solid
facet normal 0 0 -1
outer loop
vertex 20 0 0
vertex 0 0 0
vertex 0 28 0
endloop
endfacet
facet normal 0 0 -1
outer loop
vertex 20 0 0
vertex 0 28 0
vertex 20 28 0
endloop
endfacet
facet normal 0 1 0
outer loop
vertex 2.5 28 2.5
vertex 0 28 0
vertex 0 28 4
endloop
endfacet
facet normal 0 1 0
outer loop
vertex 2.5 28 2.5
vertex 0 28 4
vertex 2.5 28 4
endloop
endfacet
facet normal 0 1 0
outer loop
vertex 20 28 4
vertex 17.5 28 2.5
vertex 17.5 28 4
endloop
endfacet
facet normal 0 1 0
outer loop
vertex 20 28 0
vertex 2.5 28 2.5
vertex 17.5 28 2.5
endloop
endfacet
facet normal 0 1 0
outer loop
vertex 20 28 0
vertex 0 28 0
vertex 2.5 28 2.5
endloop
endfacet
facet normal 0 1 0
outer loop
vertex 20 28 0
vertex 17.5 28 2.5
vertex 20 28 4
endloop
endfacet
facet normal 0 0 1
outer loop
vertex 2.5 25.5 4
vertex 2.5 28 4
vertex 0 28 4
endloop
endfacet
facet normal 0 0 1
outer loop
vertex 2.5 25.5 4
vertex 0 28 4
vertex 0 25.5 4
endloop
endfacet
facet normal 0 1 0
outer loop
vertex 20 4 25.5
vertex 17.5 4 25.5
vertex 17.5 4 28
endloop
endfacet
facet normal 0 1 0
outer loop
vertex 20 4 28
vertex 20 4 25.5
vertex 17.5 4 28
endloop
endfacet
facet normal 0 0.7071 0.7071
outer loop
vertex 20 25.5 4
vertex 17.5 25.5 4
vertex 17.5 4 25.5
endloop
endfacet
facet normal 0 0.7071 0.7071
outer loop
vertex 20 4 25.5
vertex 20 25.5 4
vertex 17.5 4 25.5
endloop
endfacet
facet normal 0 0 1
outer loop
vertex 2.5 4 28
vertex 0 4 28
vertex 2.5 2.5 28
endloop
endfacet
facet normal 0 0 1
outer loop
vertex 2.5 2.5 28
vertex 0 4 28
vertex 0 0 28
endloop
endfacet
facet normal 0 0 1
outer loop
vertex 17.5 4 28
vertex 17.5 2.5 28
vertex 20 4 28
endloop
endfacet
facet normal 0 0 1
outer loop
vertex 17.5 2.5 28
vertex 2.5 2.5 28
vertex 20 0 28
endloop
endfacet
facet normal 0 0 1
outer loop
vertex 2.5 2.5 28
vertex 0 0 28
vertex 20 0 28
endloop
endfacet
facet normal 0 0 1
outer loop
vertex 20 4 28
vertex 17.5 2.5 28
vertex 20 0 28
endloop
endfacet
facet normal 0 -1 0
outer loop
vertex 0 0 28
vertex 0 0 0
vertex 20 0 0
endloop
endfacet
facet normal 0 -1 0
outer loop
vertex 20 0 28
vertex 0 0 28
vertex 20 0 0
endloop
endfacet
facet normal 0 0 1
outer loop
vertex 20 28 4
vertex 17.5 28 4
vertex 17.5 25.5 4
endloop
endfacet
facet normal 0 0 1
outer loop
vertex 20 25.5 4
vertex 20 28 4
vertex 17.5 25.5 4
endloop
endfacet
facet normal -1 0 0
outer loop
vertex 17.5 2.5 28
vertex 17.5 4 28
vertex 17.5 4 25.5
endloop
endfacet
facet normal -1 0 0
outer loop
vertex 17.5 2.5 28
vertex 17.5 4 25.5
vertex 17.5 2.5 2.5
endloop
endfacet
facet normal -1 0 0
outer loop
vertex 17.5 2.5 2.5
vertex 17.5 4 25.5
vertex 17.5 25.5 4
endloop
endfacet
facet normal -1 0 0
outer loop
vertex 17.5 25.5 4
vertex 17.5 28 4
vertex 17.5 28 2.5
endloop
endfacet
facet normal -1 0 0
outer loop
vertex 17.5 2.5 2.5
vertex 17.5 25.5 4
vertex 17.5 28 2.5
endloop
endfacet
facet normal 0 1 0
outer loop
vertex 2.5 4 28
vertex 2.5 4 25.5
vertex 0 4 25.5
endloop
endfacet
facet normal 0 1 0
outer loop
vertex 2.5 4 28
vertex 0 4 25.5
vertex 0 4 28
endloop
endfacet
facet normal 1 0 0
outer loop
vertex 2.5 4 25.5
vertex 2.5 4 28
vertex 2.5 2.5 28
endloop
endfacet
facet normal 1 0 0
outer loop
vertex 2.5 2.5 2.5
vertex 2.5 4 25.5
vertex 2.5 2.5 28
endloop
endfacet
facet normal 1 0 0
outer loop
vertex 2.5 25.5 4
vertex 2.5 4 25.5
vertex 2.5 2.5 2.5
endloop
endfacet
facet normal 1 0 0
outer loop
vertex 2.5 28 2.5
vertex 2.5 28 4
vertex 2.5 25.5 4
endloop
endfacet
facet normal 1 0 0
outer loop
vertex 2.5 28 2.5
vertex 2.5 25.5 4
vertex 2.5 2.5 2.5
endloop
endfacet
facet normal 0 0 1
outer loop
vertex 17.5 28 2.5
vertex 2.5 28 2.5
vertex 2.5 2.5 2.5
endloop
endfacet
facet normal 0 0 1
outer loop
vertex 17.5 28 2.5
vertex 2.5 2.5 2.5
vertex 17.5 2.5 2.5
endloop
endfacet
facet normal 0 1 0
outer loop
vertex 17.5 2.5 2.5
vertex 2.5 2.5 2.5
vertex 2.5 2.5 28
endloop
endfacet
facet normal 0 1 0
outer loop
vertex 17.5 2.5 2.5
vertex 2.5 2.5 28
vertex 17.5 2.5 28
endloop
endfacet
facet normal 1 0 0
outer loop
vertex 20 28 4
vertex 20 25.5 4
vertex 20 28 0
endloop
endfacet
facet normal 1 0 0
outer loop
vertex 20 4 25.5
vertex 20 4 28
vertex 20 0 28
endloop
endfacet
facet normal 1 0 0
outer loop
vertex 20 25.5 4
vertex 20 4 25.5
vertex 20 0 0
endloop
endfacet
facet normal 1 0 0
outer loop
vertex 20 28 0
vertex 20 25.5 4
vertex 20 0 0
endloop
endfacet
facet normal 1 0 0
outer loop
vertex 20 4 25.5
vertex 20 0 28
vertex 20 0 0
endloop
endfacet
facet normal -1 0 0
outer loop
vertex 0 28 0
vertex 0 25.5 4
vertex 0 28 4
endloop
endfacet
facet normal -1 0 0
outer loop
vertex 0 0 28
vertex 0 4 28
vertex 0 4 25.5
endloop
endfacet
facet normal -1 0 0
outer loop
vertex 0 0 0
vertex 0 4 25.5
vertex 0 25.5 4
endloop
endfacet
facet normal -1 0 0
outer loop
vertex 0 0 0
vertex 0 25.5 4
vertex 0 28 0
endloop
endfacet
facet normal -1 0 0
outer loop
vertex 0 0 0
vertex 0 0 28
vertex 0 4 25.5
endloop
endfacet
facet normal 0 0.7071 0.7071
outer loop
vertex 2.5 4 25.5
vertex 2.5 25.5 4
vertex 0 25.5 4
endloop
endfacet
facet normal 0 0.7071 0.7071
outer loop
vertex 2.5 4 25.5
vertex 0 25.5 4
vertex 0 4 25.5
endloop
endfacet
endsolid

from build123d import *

# Parameters (mm, degrees)
SKETCH1_W                      = 20
SKETCH1_H                      = 28
BOSS_EXTRUDE1_DEPTH            = 28
SKETCH2_W                      = 15
SKETCH2_H                      = 25.5
CUT_EXTRUDE1_DEPTH             = 25.5
CUT_EXTRUDE2_REACH             = 12
CUT_EXTRUDE2_DIRECTION_2_REACH = 12


with BuildPart() as part:
    # Sketch1 → Boss-Extrude1 (new body)
    with BuildSketch(Plane(origin=(0, 0, 0), x_dir=(1, 0, 0), z_dir=(0, 1, 0))):
        with Locations((10, -14)):
            Rectangle(SKETCH1_W, SKETCH1_H)
    extrude(amount=BOSS_EXTRUDE1_DEPTH)

    # Sketch2 → Cut-Extrude1 (cut)
    with BuildSketch(Plane(origin=(0, 28, 0), x_dir=(1, 0, 0), z_dir=(0, 1, 0))):
        with Locations((10, -15.25)):
            Rectangle(SKETCH2_W, SKETCH2_H)
    extrude(amount=-CUT_EXTRUDE1_DEPTH, mode=Mode.SUBTRACT)

    # Sketch3 → Cut-Extrude2 (cut, up to next)
    with BuildSketch(Plane.ZY.offset(-10), mode=Mode.PRIVATE) as cut_extrude2_sk1:
        Polygon((4, 28), (4, 25.5), (25.5, 4), (28, 4), (28, 28), align=None)
    cut_extrude2_tool1 = extrude(cut_extrude2_sk1.sketch, amount=-CUT_EXTRUDE2_REACH, mode=Mode.PRIVATE) & part.part
    add(cut_extrude2_tool1.solids().sort_by_distance((10, 19.239157, 19.239157))[0], mode=Mode.SUBTRACT)

    # Sketch3 → Cut-Extrude2 direction 2 (cut, up to next)
    with BuildSketch(Plane.ZY.offset(-10), mode=Mode.PRIVATE) as cut_extrude2_direction_2_sk1:
        Polygon((4, 28), (4, 25.5), (25.5, 4), (28, 4), (28, 28), align=None)
    cut_extrude2_direction_2_tool1 = extrude(cut_extrude2_direction_2_sk1.sketch, amount=CUT_EXTRUDE2_DIRECTION_2_REACH, mode=Mode.PRIVATE) & part.part
    add(cut_extrude2_direction_2_tool1.solids().sort_by_distance((10, 19.239157, 19.239157))[0], mode=Mode.SUBTRACT)


solid = part.part
